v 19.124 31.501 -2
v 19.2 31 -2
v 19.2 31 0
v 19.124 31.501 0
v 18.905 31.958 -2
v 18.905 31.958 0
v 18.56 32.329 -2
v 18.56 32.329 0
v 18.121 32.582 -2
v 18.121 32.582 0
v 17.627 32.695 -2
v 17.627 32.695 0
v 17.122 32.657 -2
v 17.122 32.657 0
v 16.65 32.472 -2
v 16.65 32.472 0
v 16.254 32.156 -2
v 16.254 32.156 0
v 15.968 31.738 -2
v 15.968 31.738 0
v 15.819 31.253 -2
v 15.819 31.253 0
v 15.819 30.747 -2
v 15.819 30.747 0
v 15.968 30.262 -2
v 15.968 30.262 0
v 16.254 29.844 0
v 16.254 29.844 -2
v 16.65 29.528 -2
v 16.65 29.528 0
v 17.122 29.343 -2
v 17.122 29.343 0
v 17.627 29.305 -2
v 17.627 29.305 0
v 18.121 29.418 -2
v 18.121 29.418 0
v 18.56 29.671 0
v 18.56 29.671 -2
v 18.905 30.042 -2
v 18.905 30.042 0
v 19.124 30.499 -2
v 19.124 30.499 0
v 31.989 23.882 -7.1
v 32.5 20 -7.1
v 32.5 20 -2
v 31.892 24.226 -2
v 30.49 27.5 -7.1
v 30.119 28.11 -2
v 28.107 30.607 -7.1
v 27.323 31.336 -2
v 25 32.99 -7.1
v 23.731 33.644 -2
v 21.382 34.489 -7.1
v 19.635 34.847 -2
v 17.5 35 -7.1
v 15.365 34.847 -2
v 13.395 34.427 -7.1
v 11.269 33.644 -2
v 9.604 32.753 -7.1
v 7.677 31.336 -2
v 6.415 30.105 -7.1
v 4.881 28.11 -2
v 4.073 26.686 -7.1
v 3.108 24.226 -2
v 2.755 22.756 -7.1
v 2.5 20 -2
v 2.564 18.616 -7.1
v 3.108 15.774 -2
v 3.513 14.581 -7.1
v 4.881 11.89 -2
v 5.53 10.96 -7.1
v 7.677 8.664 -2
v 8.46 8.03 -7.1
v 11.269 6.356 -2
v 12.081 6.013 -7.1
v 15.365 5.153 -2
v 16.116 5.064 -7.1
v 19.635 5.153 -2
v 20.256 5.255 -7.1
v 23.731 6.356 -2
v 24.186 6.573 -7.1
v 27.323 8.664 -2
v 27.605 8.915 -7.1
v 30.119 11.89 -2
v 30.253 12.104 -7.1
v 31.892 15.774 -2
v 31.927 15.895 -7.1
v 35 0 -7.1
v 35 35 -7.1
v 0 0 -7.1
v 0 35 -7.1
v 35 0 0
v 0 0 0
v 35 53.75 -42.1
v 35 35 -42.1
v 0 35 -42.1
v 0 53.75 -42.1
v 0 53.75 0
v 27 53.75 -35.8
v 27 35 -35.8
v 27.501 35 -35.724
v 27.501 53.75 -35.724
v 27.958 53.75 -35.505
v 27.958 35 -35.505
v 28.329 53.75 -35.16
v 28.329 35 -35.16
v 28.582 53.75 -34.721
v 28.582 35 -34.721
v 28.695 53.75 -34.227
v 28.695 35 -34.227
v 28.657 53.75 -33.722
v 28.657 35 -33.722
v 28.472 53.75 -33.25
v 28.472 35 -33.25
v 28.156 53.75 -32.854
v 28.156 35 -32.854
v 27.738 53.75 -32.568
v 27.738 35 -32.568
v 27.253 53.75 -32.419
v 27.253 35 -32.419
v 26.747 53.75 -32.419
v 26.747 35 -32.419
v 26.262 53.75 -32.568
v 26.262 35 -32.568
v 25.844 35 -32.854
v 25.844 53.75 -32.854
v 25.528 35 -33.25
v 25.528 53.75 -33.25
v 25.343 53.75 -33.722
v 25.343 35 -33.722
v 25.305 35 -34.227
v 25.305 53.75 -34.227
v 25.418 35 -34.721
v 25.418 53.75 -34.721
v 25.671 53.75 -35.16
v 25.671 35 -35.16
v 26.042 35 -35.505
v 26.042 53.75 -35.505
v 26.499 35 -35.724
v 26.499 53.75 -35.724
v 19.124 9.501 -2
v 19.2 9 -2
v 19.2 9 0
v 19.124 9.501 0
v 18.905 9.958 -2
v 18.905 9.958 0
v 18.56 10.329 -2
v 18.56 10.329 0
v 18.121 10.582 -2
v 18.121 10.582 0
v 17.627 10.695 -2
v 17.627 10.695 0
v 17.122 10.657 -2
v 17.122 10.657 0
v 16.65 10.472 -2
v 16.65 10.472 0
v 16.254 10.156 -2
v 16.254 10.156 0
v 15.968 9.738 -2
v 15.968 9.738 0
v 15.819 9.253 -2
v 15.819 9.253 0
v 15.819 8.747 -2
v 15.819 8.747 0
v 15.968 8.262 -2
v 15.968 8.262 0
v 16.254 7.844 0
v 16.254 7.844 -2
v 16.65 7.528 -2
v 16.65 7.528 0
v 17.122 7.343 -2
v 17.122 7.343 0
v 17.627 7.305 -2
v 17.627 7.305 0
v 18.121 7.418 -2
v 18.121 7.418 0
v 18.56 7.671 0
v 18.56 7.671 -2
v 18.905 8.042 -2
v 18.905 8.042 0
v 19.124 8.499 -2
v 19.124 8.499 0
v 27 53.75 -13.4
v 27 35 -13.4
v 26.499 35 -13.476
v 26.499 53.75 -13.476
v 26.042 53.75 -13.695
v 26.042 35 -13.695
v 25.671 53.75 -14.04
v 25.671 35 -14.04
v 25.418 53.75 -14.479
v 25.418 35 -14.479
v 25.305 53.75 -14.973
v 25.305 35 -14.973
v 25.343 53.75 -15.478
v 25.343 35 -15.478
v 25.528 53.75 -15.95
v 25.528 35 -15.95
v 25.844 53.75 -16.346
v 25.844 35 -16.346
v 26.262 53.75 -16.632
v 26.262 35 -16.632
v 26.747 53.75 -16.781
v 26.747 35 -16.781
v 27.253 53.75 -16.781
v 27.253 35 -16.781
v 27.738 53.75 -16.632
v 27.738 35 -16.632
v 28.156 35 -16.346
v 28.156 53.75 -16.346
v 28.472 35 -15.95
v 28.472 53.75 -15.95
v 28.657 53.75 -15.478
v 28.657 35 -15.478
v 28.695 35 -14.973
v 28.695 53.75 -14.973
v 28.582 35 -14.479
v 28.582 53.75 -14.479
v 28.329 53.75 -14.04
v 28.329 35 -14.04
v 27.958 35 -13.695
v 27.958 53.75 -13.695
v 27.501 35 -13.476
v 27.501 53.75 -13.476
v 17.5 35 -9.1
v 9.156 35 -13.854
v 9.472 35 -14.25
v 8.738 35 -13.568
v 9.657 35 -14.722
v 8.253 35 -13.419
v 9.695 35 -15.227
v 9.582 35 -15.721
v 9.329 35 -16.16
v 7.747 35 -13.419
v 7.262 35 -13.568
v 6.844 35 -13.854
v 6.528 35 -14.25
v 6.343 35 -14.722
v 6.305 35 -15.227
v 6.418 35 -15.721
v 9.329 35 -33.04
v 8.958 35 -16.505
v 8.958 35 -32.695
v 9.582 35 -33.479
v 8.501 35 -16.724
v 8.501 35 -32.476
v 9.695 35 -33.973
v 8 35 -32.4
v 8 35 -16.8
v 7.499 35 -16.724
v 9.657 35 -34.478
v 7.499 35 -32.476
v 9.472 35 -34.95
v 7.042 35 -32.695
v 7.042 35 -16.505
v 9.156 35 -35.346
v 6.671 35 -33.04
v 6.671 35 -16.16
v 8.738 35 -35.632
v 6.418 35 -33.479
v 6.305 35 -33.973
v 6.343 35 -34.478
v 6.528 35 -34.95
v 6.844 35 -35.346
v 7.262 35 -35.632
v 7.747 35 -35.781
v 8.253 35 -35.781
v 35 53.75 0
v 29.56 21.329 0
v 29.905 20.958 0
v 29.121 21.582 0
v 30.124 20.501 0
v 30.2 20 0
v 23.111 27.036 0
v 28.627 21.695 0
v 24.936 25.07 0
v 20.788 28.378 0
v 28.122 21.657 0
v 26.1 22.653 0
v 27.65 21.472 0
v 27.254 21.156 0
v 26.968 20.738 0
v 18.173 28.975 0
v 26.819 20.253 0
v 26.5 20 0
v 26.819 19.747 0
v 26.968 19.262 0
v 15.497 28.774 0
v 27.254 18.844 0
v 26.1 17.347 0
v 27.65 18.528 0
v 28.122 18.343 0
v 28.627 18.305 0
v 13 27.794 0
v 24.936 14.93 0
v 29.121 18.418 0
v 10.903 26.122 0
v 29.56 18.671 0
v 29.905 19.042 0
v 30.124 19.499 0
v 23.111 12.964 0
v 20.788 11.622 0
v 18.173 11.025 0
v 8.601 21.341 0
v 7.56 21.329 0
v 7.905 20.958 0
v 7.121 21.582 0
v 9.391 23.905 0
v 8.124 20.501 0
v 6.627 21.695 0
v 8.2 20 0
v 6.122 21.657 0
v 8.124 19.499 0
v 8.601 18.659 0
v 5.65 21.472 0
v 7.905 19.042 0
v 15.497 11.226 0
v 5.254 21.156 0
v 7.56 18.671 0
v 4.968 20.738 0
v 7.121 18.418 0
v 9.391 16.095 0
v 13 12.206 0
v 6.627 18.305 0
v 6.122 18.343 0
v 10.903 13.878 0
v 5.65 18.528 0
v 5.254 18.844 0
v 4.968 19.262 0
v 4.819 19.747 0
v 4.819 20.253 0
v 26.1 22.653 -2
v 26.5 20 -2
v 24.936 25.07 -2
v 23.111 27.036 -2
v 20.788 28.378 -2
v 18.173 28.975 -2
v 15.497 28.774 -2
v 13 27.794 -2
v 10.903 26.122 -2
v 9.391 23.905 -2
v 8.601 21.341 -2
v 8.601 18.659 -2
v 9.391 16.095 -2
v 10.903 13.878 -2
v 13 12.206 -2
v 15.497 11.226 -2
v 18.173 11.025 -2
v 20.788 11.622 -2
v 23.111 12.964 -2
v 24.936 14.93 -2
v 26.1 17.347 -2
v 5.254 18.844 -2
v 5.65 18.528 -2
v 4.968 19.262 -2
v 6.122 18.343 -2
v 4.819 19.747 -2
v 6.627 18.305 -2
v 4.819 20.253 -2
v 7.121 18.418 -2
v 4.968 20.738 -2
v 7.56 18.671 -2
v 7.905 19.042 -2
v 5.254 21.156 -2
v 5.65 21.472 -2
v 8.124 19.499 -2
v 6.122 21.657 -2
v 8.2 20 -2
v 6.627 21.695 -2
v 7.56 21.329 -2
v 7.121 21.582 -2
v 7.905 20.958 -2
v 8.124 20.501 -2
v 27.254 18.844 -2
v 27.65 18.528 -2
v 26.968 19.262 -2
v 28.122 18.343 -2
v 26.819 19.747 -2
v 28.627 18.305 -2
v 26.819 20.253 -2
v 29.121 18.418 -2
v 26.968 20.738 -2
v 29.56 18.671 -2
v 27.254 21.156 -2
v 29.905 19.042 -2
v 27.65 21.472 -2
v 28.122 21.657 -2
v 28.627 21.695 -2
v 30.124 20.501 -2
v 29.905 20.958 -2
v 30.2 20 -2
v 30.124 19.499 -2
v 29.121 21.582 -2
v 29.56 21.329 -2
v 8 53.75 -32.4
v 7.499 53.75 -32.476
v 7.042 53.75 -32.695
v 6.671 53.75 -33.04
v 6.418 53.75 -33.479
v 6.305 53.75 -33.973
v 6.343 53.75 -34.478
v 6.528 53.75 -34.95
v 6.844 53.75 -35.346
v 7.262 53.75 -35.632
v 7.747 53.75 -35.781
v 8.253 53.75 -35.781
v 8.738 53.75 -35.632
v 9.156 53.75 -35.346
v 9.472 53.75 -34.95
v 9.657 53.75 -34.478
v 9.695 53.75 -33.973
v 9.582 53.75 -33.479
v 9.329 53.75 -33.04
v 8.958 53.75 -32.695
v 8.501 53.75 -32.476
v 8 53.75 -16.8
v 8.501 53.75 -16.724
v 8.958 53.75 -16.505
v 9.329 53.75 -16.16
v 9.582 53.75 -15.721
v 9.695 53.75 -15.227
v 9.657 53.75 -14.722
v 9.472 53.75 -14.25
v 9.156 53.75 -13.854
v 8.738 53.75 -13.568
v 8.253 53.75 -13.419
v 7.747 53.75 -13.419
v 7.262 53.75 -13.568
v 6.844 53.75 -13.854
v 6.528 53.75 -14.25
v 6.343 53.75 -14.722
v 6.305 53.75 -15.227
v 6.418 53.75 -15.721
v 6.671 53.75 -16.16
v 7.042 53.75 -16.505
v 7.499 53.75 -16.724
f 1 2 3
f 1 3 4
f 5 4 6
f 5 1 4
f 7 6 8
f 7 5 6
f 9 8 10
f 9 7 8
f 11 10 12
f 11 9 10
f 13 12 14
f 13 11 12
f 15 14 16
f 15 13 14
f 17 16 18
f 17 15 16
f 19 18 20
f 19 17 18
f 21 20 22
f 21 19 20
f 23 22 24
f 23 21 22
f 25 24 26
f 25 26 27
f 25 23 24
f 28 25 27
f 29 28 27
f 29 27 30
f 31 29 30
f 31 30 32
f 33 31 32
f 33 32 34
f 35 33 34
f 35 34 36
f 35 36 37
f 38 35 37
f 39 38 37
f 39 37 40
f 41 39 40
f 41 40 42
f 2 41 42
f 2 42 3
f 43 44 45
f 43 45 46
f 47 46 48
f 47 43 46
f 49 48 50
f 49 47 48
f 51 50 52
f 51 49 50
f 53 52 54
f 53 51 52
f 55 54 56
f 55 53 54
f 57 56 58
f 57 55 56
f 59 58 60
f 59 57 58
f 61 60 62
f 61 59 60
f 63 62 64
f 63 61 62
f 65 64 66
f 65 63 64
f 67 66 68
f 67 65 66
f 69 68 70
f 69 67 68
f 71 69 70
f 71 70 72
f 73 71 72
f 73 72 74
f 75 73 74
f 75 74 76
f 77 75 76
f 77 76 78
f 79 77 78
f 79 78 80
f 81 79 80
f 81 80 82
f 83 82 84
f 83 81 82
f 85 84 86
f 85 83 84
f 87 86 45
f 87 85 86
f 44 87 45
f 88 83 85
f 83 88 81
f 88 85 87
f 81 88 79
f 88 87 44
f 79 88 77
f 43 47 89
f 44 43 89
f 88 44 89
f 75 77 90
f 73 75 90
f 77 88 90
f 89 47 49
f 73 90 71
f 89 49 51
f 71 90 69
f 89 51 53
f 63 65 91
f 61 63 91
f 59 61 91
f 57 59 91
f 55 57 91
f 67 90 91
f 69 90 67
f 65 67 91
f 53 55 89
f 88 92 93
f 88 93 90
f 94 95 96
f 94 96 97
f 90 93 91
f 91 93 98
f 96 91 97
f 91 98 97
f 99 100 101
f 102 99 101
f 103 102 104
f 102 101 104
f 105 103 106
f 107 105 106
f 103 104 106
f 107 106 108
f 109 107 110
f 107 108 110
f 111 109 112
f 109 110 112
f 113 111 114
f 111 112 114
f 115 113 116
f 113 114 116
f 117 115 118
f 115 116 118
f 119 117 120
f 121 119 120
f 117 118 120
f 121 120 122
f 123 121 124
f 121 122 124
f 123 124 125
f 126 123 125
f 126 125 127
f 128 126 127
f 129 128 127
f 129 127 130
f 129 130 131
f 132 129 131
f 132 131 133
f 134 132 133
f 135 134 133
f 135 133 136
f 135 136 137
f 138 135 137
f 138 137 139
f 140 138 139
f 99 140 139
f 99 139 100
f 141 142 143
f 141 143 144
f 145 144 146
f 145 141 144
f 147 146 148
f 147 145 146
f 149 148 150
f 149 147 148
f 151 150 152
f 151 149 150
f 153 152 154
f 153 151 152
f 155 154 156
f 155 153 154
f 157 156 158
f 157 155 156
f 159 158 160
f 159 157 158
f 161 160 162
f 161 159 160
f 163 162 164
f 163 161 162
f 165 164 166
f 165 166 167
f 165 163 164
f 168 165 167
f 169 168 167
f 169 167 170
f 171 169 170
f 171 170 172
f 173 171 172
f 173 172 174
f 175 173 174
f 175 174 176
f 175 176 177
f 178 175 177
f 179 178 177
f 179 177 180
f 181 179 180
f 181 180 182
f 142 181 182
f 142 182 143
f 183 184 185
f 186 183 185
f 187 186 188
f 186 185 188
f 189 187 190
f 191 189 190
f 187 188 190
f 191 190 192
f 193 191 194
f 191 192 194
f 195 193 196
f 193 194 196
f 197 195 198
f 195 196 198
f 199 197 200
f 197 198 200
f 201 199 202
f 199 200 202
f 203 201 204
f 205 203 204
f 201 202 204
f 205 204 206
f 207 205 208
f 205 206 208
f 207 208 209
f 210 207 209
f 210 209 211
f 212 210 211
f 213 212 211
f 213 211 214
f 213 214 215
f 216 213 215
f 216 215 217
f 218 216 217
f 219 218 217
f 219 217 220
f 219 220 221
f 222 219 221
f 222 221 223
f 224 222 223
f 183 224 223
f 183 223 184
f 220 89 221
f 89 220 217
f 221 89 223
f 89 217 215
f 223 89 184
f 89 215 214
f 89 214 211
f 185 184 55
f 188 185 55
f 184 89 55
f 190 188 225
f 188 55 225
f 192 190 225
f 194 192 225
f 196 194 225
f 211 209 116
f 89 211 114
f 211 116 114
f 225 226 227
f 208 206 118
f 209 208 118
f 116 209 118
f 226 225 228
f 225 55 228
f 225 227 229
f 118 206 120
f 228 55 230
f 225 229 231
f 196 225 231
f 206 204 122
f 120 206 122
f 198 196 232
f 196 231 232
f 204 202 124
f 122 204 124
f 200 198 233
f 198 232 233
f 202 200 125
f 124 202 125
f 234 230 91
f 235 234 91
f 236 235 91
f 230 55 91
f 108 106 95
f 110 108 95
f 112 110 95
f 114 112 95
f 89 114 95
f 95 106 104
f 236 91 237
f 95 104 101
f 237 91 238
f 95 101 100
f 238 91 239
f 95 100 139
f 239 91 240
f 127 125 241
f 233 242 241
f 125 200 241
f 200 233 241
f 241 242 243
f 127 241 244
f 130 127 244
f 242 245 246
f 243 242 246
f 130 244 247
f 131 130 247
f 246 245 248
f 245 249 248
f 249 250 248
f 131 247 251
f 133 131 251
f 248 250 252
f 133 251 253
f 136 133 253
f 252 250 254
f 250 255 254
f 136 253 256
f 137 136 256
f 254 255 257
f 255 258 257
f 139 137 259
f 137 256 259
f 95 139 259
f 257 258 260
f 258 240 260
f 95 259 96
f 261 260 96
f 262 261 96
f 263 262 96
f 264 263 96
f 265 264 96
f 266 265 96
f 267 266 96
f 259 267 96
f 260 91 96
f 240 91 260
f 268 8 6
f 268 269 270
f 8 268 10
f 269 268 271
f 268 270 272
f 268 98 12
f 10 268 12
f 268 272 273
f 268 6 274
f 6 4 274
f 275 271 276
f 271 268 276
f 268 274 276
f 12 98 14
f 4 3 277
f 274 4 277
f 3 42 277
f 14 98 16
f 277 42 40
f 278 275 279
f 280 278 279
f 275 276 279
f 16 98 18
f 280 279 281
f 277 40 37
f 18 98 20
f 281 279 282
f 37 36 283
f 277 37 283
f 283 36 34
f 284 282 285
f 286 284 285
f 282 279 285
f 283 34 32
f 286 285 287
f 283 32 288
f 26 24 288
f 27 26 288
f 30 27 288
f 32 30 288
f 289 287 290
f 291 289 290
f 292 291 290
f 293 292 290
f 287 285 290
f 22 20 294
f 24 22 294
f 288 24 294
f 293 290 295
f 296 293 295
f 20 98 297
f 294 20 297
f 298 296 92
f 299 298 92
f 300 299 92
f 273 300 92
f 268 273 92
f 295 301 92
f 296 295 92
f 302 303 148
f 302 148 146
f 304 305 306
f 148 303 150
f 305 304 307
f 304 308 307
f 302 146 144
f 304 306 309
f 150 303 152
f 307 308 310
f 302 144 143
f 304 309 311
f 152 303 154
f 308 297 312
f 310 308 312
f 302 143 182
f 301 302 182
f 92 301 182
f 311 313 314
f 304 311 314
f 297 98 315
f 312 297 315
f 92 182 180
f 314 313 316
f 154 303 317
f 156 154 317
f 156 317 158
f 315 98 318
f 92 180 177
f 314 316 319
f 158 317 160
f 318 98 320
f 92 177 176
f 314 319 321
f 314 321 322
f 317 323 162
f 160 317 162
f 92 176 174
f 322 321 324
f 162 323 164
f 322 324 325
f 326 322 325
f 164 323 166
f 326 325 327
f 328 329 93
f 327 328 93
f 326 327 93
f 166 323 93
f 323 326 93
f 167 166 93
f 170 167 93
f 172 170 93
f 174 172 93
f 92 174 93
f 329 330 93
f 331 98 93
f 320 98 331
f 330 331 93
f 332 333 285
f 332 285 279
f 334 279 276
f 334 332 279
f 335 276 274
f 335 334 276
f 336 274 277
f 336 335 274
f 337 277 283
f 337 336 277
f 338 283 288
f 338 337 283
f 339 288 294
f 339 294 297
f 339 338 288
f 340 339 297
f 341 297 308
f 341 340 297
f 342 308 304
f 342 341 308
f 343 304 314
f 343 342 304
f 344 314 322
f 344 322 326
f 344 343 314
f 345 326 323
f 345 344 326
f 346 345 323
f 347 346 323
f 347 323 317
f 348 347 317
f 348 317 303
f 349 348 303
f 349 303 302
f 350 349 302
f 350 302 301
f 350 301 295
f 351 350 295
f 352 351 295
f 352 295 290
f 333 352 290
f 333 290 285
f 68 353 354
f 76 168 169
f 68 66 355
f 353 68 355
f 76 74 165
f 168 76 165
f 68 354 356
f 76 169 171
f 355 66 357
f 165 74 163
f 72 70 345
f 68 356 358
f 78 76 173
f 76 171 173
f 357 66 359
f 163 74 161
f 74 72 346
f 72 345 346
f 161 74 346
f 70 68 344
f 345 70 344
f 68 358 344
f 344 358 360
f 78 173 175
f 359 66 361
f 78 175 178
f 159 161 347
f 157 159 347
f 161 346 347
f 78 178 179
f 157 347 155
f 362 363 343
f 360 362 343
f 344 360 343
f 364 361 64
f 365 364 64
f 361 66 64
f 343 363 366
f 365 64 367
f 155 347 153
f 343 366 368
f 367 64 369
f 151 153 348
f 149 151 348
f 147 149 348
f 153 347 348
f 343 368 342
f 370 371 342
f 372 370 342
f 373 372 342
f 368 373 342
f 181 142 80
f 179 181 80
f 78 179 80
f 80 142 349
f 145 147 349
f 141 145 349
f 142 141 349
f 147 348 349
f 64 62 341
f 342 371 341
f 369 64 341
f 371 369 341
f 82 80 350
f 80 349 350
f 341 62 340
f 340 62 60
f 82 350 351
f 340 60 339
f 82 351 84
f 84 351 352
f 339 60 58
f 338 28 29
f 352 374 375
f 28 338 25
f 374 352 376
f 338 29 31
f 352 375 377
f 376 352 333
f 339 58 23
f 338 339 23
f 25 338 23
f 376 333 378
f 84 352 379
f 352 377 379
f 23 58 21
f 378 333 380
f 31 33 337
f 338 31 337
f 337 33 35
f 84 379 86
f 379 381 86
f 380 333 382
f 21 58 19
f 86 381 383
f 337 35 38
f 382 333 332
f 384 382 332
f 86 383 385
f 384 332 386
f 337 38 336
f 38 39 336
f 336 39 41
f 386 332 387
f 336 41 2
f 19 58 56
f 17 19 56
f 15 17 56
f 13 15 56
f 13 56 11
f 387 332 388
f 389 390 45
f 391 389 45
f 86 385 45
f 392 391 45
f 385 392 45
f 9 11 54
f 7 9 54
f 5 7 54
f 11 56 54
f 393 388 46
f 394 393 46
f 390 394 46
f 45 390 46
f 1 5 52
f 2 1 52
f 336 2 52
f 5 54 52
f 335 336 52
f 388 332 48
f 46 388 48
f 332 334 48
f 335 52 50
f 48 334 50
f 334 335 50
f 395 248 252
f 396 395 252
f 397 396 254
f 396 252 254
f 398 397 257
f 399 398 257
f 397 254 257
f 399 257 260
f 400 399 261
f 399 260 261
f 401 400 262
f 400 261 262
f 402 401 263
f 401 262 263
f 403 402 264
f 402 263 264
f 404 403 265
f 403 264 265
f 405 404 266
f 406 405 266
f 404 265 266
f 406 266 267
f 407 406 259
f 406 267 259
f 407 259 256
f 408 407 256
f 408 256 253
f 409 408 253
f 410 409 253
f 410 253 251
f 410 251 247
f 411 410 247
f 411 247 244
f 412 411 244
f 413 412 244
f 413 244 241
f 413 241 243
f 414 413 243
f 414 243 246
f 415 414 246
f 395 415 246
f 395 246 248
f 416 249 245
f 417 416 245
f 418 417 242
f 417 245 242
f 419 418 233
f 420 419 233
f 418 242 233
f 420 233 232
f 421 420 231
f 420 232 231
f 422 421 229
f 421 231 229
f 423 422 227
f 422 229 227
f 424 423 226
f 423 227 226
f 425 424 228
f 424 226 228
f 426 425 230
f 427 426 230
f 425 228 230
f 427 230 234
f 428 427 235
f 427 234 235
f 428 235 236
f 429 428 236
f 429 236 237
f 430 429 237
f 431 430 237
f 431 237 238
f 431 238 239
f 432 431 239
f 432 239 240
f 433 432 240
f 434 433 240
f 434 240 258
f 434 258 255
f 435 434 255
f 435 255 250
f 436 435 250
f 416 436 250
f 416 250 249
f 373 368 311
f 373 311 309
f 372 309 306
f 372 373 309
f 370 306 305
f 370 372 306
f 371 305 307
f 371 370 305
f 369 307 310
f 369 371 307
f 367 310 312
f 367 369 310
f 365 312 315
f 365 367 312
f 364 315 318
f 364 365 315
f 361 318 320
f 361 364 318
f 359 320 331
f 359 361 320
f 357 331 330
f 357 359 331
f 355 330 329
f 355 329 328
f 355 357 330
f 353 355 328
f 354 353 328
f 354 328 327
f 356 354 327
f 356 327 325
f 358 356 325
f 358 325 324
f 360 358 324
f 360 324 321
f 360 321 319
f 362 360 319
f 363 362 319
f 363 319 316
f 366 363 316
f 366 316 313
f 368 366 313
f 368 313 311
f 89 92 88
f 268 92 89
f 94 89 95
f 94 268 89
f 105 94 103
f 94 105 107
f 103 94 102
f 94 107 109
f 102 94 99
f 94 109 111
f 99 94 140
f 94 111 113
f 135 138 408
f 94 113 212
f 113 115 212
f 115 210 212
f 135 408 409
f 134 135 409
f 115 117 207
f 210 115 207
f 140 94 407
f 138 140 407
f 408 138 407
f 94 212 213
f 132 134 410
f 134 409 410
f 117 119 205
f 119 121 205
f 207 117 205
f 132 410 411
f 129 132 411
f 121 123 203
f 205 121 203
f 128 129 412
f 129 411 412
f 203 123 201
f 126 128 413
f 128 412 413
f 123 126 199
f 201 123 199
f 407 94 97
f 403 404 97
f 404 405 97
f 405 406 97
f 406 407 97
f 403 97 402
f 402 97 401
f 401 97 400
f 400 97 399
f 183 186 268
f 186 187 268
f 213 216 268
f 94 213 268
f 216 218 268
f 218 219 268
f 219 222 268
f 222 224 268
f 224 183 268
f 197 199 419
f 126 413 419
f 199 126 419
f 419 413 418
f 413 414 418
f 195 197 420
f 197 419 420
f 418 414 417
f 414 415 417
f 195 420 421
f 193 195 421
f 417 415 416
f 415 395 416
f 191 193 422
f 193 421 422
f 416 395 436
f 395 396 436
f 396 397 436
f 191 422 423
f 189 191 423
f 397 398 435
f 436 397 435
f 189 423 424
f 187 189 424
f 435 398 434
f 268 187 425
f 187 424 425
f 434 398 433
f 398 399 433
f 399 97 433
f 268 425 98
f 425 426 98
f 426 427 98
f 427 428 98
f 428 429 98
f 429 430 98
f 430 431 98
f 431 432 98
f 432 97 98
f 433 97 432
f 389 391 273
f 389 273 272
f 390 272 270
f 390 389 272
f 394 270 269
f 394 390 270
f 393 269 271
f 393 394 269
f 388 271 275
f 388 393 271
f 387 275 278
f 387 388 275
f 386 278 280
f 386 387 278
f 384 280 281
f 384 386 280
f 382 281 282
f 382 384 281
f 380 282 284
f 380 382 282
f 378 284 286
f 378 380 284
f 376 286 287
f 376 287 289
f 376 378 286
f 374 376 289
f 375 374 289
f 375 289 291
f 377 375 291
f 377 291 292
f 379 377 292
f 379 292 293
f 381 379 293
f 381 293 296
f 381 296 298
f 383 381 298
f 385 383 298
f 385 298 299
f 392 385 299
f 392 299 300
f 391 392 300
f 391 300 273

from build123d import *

# Parameters (mm, degrees)
BOSS_EXTRUDE1_DEPTH                = 35
MOTOR_START                        = -7.1
MOTOR_MOUNT_BOLT_HOLES_OUTLINE_R   = 1.7
MOTOR_MOUNT_BOLT_HOLES_OUTLINE_R_2 = 9
MOTOR_MOUNT_BOLT_HOLES_DEPTH       = 7.1
MOTOR_COUNTERSINK_DEPTH            = 5.1
MOTOR_COUNTERSINK_DEPTH_BACK       = 2
MOTOR_COUNTERSINK_START            = -7.1
SKETCH2_5_R                        = 15
SKETCH3_R                          = 1.7
CUT_EXTRUDE3_DEPTH                 = 65.980073869


# Read off the part's stored shape, not the designer's step: Motor mount bolt holes
with BuildPart() as part:
    # Sketch1 → Boss-Extrude1 (new body)
    with BuildSketch(Plane(origin=(0, 0, 0), x_dir=(0, 0, -1), z_dir=(1, 0, 0))):
        Polygon((0, 0), (7.1, 0), (7.1, 35), (42.1, 35), (42.1, 53.75), (0, 53.75), align=None)
    extrude(amount=BOSS_EXTRUDE1_DEPTH)

    # Motor mount bolt holes outline → Motor mount bolt holes (cut)
    with BuildSketch(Plane.XY.offset(MOTOR_START)):
        with Locations((17.5, 9)):
            Circle(MOTOR_MOUNT_BOLT_HOLES_OUTLINE_R)
        with Locations((28.5, 20)):
            Circle(MOTOR_MOUNT_BOLT_HOLES_OUTLINE_R)
        with Locations((17.5, 31)):
            Circle(MOTOR_MOUNT_BOLT_HOLES_OUTLINE_R)
        with Locations((17.5, 20)):
            Circle(MOTOR_MOUNT_BOLT_HOLES_OUTLINE_R_2)
        with Locations((6.5, 20)):
            Circle(MOTOR_MOUNT_BOLT_HOLES_OUTLINE_R)
    extrude(amount=MOTOR_MOUNT_BOLT_HOLES_DEPTH, mode=Mode.SUBTRACT)

    # Sketch2<5> → Motor Countersink (cut, two sides: drawn at the far end of the back side and taken through both)
    with BuildSketch(Plane.XY.offset(MOTOR_COUNTERSINK_START - MOTOR_COUNTERSINK_DEPTH_BACK)):
        with Locations((17.5, 20)):
            Circle(SKETCH2_5_R)
    extrude(amount=MOTOR_COUNTERSINK_DEPTH + MOTOR_COUNTERSINK_DEPTH_BACK, mode=Mode.SUBTRACT)

    # Sketch3 → Cut-Extrude3 (cut, through all)
    with BuildSketch(Plane.XZ.offset(-35)):
        with Locations(Location((8, -15.1, 0), (0, 0, 270))):
            Circle(SKETCH3_R)
        with Locations(Location((27, -15.1, 0), (0, 0, 90))):
            Circle(SKETCH3_R)
        with Locations(Location((27, -34.1, 0), (0, 0, 270))):
            Circle(SKETCH3_R)
        with Locations(Location((8, -34.1, 0), (0, 0, 90))):
            Circle(SKETCH3_R)
    extrude(amount=-CUT_EXTRUDE3_DEPTH, mode=Mode.SUBTRACT)


solid = part.part
